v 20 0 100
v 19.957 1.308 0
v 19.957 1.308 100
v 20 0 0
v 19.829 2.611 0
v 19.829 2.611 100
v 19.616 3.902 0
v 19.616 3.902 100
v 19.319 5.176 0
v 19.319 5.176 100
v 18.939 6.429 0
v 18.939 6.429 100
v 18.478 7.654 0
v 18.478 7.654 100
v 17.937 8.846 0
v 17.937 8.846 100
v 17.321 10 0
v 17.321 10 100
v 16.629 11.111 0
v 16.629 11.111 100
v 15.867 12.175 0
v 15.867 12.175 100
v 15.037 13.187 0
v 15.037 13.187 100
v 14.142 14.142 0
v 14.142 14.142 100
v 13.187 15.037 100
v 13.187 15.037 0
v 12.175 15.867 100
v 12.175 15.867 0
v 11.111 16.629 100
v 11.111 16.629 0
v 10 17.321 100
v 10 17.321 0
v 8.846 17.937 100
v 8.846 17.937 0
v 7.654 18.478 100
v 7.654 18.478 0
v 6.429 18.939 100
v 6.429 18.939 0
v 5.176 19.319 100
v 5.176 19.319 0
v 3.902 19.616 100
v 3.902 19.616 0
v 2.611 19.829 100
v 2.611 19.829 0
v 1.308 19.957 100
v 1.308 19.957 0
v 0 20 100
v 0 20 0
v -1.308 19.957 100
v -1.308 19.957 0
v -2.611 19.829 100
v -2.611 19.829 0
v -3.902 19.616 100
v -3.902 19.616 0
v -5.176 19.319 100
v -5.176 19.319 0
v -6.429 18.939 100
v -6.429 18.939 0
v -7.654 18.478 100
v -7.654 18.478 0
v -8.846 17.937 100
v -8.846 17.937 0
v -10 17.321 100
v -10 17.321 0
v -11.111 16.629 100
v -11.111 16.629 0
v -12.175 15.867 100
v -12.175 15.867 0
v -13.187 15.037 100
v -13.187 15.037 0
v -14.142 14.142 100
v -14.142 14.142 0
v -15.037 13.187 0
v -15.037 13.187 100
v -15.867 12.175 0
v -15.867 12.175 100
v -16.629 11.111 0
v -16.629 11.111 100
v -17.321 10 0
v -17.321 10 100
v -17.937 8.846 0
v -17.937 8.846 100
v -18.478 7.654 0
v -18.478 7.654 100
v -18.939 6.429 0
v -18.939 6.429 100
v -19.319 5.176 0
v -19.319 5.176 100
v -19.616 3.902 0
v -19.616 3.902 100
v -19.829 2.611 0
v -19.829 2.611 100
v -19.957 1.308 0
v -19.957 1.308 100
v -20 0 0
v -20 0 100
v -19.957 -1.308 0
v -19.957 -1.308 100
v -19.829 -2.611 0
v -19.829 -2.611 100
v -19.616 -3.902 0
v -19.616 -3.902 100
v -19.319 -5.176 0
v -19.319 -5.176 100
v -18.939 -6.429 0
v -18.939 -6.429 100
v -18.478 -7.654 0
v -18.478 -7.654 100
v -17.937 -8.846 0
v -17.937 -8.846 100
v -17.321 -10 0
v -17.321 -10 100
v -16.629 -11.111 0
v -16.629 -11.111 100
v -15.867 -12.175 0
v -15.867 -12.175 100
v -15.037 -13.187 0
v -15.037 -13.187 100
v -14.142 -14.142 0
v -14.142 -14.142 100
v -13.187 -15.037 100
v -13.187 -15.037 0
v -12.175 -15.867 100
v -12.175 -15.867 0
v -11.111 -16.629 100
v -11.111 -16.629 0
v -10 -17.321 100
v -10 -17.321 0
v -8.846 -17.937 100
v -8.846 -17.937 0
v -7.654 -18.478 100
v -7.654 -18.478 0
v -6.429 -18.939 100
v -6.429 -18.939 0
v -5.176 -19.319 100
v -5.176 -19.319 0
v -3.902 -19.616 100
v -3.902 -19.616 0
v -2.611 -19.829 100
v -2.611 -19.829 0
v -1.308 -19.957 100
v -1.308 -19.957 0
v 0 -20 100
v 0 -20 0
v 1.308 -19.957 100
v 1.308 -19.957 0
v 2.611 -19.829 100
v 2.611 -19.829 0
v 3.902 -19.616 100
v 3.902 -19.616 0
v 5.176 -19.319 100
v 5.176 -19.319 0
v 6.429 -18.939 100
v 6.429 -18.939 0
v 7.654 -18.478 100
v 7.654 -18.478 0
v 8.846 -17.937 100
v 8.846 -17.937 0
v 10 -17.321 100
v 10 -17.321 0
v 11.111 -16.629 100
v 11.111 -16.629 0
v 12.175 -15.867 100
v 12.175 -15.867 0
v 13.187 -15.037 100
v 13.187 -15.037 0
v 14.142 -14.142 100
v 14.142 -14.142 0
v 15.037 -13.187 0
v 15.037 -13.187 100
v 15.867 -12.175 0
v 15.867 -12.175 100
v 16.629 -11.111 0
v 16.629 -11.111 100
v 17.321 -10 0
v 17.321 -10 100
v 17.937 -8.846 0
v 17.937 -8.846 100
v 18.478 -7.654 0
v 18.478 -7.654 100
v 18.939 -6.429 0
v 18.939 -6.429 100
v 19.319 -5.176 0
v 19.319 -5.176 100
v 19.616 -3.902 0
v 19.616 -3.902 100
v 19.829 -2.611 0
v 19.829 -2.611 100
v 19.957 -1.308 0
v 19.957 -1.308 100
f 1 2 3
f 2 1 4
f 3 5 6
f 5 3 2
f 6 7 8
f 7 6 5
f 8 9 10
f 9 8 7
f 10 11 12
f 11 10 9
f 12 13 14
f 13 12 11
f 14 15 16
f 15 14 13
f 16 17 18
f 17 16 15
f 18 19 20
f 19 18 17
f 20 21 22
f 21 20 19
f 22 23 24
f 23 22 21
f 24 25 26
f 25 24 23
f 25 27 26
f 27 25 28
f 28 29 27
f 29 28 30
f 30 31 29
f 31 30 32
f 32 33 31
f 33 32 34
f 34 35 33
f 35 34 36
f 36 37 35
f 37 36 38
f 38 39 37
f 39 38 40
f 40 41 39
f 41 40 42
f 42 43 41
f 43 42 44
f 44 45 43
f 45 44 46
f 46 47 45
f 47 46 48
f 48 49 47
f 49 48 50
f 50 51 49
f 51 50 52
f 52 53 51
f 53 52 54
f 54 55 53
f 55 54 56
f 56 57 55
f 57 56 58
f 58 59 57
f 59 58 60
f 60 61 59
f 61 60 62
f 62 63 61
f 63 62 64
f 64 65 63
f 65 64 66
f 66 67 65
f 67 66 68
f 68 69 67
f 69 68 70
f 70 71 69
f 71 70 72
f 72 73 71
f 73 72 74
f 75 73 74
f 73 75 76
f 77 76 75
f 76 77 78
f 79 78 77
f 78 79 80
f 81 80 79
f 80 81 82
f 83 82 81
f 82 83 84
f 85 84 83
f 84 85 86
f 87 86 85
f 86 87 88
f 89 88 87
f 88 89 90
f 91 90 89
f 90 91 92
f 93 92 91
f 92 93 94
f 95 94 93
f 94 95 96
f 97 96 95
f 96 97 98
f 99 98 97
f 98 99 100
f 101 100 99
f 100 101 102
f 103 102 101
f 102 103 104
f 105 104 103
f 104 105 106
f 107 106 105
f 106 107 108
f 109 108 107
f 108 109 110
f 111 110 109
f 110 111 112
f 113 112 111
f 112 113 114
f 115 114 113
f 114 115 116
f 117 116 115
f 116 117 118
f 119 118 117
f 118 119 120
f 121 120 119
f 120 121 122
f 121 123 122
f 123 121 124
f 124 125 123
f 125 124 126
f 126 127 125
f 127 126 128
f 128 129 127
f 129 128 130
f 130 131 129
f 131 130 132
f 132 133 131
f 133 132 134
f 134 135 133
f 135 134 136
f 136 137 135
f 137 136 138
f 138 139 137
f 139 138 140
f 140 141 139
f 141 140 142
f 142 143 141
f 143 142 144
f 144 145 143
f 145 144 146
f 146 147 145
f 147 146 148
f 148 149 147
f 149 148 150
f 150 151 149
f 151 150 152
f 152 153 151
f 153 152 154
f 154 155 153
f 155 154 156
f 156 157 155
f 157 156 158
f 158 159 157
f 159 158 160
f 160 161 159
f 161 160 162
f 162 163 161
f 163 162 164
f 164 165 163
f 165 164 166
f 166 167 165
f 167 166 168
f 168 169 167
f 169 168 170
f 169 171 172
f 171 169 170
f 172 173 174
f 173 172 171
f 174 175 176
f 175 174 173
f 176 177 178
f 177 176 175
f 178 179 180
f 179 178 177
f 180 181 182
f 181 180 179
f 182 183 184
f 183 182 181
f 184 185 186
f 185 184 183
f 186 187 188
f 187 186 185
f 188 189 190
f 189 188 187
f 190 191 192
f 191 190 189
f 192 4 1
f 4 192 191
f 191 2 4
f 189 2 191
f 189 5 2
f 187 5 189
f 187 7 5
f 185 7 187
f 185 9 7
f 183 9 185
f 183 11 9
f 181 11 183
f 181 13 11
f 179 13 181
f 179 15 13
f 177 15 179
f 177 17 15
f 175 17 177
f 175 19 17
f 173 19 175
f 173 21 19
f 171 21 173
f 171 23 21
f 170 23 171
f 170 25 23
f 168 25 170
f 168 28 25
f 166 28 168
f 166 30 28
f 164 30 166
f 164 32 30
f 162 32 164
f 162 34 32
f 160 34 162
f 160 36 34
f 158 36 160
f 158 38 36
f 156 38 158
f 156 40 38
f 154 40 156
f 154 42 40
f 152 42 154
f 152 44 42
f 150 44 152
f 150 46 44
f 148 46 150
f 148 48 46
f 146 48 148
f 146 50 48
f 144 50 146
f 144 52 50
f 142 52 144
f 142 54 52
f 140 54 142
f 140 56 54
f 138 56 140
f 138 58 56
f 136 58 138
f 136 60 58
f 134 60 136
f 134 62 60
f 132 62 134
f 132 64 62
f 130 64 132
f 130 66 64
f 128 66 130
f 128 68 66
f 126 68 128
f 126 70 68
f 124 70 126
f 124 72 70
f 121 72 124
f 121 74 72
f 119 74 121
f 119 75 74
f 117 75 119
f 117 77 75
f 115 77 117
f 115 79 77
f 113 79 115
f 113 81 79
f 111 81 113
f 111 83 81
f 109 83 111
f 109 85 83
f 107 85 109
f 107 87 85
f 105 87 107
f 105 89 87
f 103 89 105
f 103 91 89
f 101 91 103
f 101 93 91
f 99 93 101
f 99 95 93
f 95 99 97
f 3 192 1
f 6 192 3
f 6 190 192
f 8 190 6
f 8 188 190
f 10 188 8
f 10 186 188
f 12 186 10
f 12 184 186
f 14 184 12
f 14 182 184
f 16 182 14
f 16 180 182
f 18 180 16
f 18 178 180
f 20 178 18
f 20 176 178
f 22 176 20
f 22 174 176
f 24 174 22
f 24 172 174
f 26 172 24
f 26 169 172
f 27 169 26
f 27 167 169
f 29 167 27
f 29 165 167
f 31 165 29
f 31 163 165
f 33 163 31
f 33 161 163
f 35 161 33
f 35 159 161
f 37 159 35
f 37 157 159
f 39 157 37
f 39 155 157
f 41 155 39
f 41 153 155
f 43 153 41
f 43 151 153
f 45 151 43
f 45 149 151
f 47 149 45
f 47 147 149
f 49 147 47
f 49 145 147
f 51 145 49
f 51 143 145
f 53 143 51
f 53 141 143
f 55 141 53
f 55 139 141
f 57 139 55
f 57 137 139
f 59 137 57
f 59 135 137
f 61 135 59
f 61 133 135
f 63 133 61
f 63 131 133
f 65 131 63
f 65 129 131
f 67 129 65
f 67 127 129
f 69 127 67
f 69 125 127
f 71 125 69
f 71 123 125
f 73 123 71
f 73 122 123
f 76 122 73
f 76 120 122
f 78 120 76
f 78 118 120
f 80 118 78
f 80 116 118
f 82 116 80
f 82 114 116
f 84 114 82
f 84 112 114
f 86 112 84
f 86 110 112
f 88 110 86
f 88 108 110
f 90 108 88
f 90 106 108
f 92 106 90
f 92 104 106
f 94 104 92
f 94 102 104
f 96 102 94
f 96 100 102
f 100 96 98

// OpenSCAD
radius = 20.0;
height = 100.0;
cylinder(r=radius, h=height, $fn=96);
